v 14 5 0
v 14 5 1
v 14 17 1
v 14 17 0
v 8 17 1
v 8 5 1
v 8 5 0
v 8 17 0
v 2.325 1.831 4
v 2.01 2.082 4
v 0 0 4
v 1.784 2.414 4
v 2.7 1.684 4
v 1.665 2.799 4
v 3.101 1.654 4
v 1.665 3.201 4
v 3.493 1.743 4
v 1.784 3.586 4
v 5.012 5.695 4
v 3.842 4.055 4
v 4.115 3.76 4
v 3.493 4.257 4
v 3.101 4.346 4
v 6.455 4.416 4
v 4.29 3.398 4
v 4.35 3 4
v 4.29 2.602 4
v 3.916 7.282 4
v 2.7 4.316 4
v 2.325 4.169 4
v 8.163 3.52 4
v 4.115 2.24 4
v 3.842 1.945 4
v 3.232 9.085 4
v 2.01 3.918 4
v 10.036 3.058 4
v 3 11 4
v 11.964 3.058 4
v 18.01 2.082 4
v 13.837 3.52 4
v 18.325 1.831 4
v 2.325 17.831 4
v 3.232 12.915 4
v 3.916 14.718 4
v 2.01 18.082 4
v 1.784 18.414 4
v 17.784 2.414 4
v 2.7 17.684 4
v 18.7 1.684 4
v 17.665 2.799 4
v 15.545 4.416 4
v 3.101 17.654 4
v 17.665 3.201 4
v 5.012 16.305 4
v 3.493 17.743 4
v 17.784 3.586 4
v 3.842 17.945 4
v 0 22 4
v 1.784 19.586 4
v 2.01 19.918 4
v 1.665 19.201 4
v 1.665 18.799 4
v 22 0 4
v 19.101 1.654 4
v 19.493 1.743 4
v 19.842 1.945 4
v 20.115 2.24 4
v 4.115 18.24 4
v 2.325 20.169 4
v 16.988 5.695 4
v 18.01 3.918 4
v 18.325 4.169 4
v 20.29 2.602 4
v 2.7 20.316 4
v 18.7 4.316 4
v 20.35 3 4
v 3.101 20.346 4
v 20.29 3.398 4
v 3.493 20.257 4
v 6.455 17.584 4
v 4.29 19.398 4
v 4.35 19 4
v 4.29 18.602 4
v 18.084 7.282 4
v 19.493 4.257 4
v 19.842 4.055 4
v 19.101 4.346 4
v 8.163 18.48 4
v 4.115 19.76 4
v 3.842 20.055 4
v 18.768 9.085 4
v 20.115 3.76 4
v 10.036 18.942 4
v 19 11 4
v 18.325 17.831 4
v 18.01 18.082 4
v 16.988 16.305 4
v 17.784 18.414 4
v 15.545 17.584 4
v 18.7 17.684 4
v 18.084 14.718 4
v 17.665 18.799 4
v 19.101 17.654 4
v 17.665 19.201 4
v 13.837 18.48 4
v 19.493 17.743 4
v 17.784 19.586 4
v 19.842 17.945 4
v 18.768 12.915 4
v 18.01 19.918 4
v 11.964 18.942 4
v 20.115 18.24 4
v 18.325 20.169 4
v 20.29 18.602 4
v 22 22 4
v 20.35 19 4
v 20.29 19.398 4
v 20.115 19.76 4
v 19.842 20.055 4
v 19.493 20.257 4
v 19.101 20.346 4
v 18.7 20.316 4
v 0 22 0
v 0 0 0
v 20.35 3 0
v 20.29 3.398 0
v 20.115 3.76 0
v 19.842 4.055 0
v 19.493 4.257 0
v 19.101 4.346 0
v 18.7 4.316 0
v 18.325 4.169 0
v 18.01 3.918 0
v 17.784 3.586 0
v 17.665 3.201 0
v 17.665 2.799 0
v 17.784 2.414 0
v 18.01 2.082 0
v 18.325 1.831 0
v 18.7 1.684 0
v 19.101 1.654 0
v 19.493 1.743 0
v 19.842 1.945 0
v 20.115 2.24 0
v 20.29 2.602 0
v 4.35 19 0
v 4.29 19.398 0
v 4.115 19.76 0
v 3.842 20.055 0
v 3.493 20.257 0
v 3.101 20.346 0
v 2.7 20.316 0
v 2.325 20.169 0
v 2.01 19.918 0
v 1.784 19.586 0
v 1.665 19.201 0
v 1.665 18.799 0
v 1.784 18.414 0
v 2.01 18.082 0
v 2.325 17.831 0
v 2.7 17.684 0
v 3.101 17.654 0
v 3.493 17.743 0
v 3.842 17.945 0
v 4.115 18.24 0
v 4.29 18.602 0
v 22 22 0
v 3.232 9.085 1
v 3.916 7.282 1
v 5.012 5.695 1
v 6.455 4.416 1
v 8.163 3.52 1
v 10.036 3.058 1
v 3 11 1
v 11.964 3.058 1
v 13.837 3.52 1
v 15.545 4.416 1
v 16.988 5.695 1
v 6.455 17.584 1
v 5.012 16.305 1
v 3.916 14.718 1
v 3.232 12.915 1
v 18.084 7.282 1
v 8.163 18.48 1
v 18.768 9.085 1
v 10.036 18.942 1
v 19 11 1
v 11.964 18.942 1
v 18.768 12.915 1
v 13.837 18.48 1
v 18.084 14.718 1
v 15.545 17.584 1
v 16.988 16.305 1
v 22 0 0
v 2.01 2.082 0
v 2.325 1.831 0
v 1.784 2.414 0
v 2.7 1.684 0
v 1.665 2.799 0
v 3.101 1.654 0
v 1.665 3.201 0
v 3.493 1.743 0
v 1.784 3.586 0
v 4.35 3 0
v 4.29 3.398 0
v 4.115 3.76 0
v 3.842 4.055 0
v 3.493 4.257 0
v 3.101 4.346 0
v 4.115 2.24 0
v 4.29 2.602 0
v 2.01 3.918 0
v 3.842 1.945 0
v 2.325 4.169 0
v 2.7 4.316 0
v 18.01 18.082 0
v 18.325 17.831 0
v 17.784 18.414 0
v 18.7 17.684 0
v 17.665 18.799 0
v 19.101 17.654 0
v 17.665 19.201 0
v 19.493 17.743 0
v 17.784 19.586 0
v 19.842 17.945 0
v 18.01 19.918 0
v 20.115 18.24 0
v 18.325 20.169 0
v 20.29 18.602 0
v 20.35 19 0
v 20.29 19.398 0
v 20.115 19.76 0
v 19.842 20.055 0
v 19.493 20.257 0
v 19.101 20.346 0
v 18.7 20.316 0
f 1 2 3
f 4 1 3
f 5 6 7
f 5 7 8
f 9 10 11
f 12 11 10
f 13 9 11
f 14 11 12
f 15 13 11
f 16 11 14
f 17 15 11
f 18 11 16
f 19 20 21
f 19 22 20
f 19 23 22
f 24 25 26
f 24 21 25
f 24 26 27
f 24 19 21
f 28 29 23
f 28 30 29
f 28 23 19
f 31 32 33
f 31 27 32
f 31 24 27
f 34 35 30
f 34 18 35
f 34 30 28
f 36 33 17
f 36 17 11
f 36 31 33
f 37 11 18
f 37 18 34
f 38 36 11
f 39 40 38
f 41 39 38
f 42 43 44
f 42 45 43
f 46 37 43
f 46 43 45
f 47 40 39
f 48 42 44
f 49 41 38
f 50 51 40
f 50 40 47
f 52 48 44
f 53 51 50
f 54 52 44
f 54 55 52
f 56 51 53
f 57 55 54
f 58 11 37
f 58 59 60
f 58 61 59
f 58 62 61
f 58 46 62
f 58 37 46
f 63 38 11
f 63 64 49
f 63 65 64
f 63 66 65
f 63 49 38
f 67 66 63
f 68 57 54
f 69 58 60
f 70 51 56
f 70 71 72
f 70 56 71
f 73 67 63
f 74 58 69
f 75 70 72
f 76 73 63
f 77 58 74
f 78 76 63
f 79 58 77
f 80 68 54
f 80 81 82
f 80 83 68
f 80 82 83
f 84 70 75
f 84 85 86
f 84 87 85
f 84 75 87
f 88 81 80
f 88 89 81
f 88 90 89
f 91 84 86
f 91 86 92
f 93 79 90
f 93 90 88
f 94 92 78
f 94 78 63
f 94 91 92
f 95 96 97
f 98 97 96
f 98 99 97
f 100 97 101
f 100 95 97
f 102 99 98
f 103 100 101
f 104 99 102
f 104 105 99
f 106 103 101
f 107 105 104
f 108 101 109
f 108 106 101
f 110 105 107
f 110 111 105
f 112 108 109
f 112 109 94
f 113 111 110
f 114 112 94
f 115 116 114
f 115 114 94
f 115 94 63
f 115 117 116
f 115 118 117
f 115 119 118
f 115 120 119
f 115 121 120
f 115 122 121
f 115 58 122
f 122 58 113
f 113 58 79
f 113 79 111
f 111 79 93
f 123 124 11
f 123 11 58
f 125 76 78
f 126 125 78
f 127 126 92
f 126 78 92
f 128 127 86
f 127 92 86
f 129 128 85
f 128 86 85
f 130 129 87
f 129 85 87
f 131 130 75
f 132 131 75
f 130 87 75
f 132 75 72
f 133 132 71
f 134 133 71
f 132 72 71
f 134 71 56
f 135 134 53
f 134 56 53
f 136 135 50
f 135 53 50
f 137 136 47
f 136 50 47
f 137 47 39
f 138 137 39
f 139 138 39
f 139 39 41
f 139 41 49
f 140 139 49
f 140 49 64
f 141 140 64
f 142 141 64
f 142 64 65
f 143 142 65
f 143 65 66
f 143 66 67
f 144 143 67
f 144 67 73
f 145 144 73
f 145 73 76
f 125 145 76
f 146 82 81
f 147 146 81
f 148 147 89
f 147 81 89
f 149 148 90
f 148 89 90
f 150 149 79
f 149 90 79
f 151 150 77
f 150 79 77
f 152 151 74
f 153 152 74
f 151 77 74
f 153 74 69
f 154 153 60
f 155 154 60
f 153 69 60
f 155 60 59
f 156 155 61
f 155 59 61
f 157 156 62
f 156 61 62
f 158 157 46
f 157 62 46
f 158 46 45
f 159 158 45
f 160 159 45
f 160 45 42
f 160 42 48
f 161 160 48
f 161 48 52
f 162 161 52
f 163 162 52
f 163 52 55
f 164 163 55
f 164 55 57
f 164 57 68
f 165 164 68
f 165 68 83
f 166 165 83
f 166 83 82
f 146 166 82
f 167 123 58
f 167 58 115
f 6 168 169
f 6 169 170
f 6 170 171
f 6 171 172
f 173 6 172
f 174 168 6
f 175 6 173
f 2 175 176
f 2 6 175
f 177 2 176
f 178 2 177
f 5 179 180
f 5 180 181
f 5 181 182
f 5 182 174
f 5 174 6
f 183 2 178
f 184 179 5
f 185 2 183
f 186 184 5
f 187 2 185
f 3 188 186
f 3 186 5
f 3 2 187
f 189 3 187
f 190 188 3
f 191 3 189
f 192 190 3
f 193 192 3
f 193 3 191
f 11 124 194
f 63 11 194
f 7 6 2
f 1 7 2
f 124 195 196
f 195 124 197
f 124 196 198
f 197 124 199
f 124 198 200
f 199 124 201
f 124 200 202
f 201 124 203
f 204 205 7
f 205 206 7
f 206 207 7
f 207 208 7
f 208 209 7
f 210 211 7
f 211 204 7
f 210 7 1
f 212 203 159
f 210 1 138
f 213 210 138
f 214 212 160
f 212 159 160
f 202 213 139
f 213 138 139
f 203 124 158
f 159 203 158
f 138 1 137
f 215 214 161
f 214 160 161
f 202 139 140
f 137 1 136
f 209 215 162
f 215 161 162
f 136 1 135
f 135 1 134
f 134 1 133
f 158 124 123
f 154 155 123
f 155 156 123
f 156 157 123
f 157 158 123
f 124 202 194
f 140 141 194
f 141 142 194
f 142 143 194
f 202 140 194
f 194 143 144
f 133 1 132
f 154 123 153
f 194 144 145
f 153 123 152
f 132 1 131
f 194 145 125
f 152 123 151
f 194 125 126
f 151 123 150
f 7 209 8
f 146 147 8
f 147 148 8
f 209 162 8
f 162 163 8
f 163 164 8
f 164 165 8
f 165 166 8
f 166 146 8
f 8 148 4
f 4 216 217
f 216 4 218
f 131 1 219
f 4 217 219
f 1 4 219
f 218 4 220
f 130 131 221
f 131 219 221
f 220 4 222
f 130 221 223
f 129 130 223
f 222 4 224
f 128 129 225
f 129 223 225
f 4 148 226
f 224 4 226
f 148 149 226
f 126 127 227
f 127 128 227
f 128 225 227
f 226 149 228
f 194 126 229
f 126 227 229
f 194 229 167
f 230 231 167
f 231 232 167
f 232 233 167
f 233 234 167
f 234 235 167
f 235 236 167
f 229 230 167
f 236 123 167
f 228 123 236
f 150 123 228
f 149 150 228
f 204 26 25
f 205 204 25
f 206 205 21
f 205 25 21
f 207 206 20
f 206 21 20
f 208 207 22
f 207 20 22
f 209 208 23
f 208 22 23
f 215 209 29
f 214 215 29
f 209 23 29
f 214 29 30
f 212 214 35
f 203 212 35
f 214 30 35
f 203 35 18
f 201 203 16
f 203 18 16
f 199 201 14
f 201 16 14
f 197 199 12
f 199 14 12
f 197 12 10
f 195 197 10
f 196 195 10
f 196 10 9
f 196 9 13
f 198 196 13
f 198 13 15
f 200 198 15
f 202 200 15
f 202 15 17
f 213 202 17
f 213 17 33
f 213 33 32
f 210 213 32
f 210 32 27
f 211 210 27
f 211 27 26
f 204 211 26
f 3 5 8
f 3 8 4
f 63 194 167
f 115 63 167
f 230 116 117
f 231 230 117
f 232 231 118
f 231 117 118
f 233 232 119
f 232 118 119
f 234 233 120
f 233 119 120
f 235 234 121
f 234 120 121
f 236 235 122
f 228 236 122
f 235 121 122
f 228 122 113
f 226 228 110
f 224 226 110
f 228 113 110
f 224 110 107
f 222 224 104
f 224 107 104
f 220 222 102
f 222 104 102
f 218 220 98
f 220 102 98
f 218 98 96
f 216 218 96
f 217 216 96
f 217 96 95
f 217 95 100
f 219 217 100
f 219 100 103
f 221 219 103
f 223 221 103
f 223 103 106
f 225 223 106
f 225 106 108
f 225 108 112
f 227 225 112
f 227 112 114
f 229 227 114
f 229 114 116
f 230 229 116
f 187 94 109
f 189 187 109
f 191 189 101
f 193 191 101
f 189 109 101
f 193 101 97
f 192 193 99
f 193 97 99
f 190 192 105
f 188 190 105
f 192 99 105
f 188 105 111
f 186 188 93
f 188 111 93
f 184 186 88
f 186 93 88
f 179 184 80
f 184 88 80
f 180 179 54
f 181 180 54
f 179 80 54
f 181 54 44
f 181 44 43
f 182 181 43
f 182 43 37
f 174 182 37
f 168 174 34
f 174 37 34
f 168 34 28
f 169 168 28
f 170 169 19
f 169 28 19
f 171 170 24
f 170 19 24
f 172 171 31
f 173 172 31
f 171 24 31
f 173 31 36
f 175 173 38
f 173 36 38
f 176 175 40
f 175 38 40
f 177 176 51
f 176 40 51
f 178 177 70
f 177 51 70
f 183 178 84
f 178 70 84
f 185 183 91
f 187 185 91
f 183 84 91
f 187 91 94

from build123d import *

# Parameters (mm, degrees)
F0_W     = 22
F0_H     = 22
F1_DEPTH = 4
F3_R     = 1.35
F4_DEPTH = 4.001
F5_W     = 6
F5_H     = 12
F6_DEPTH = 4.001
F5_R     = 8
F7_DEPTH = 3


with BuildPart() as f1:
    # F0 (on Top) → F1 (new body)
    with BuildSketch(Plane.XY):
        with Locations((11, 11)):
            Rectangle(F0_W, F0_H)
    extrude(amount=F1_DEPTH)

    # F3 (on face) → F4 (cut, through all)
    with BuildSketch(Plane.XY.offset(4)):
        with Locations((3, 3)):
            Circle(F3_R)
        with Locations((3, 19)):
            Circle(F3_R)
        with Locations((19, 3)):
            Circle(F3_R)
        with Locations((19, 19)):
            Circle(F3_R)
    extrude(amount=-F4_DEPTH, mode=Mode.SUBTRACT)

    # F5 (on face) → F6 (cut, through all)
    with BuildSketch(Plane.XY.offset(4)):
        with Locations((11, 11)):
            Rectangle(F5_W, F5_H)
    extrude(amount=-F6_DEPTH, mode=Mode.SUBTRACT)

    # F5 (on face) → F7 (cut, through all)
    with BuildSketch(Plane.XY.offset(4)):
        with Locations((11, 11)):
            Circle(F5_R)
        with Locations((11, 11)):
            Rectangle(F5_W, F5_H, mode=Mode.SUBTRACT)
    extrude(amount=-F7_DEPTH, mode=Mode.SUBTRACT)


solid = f1.part
